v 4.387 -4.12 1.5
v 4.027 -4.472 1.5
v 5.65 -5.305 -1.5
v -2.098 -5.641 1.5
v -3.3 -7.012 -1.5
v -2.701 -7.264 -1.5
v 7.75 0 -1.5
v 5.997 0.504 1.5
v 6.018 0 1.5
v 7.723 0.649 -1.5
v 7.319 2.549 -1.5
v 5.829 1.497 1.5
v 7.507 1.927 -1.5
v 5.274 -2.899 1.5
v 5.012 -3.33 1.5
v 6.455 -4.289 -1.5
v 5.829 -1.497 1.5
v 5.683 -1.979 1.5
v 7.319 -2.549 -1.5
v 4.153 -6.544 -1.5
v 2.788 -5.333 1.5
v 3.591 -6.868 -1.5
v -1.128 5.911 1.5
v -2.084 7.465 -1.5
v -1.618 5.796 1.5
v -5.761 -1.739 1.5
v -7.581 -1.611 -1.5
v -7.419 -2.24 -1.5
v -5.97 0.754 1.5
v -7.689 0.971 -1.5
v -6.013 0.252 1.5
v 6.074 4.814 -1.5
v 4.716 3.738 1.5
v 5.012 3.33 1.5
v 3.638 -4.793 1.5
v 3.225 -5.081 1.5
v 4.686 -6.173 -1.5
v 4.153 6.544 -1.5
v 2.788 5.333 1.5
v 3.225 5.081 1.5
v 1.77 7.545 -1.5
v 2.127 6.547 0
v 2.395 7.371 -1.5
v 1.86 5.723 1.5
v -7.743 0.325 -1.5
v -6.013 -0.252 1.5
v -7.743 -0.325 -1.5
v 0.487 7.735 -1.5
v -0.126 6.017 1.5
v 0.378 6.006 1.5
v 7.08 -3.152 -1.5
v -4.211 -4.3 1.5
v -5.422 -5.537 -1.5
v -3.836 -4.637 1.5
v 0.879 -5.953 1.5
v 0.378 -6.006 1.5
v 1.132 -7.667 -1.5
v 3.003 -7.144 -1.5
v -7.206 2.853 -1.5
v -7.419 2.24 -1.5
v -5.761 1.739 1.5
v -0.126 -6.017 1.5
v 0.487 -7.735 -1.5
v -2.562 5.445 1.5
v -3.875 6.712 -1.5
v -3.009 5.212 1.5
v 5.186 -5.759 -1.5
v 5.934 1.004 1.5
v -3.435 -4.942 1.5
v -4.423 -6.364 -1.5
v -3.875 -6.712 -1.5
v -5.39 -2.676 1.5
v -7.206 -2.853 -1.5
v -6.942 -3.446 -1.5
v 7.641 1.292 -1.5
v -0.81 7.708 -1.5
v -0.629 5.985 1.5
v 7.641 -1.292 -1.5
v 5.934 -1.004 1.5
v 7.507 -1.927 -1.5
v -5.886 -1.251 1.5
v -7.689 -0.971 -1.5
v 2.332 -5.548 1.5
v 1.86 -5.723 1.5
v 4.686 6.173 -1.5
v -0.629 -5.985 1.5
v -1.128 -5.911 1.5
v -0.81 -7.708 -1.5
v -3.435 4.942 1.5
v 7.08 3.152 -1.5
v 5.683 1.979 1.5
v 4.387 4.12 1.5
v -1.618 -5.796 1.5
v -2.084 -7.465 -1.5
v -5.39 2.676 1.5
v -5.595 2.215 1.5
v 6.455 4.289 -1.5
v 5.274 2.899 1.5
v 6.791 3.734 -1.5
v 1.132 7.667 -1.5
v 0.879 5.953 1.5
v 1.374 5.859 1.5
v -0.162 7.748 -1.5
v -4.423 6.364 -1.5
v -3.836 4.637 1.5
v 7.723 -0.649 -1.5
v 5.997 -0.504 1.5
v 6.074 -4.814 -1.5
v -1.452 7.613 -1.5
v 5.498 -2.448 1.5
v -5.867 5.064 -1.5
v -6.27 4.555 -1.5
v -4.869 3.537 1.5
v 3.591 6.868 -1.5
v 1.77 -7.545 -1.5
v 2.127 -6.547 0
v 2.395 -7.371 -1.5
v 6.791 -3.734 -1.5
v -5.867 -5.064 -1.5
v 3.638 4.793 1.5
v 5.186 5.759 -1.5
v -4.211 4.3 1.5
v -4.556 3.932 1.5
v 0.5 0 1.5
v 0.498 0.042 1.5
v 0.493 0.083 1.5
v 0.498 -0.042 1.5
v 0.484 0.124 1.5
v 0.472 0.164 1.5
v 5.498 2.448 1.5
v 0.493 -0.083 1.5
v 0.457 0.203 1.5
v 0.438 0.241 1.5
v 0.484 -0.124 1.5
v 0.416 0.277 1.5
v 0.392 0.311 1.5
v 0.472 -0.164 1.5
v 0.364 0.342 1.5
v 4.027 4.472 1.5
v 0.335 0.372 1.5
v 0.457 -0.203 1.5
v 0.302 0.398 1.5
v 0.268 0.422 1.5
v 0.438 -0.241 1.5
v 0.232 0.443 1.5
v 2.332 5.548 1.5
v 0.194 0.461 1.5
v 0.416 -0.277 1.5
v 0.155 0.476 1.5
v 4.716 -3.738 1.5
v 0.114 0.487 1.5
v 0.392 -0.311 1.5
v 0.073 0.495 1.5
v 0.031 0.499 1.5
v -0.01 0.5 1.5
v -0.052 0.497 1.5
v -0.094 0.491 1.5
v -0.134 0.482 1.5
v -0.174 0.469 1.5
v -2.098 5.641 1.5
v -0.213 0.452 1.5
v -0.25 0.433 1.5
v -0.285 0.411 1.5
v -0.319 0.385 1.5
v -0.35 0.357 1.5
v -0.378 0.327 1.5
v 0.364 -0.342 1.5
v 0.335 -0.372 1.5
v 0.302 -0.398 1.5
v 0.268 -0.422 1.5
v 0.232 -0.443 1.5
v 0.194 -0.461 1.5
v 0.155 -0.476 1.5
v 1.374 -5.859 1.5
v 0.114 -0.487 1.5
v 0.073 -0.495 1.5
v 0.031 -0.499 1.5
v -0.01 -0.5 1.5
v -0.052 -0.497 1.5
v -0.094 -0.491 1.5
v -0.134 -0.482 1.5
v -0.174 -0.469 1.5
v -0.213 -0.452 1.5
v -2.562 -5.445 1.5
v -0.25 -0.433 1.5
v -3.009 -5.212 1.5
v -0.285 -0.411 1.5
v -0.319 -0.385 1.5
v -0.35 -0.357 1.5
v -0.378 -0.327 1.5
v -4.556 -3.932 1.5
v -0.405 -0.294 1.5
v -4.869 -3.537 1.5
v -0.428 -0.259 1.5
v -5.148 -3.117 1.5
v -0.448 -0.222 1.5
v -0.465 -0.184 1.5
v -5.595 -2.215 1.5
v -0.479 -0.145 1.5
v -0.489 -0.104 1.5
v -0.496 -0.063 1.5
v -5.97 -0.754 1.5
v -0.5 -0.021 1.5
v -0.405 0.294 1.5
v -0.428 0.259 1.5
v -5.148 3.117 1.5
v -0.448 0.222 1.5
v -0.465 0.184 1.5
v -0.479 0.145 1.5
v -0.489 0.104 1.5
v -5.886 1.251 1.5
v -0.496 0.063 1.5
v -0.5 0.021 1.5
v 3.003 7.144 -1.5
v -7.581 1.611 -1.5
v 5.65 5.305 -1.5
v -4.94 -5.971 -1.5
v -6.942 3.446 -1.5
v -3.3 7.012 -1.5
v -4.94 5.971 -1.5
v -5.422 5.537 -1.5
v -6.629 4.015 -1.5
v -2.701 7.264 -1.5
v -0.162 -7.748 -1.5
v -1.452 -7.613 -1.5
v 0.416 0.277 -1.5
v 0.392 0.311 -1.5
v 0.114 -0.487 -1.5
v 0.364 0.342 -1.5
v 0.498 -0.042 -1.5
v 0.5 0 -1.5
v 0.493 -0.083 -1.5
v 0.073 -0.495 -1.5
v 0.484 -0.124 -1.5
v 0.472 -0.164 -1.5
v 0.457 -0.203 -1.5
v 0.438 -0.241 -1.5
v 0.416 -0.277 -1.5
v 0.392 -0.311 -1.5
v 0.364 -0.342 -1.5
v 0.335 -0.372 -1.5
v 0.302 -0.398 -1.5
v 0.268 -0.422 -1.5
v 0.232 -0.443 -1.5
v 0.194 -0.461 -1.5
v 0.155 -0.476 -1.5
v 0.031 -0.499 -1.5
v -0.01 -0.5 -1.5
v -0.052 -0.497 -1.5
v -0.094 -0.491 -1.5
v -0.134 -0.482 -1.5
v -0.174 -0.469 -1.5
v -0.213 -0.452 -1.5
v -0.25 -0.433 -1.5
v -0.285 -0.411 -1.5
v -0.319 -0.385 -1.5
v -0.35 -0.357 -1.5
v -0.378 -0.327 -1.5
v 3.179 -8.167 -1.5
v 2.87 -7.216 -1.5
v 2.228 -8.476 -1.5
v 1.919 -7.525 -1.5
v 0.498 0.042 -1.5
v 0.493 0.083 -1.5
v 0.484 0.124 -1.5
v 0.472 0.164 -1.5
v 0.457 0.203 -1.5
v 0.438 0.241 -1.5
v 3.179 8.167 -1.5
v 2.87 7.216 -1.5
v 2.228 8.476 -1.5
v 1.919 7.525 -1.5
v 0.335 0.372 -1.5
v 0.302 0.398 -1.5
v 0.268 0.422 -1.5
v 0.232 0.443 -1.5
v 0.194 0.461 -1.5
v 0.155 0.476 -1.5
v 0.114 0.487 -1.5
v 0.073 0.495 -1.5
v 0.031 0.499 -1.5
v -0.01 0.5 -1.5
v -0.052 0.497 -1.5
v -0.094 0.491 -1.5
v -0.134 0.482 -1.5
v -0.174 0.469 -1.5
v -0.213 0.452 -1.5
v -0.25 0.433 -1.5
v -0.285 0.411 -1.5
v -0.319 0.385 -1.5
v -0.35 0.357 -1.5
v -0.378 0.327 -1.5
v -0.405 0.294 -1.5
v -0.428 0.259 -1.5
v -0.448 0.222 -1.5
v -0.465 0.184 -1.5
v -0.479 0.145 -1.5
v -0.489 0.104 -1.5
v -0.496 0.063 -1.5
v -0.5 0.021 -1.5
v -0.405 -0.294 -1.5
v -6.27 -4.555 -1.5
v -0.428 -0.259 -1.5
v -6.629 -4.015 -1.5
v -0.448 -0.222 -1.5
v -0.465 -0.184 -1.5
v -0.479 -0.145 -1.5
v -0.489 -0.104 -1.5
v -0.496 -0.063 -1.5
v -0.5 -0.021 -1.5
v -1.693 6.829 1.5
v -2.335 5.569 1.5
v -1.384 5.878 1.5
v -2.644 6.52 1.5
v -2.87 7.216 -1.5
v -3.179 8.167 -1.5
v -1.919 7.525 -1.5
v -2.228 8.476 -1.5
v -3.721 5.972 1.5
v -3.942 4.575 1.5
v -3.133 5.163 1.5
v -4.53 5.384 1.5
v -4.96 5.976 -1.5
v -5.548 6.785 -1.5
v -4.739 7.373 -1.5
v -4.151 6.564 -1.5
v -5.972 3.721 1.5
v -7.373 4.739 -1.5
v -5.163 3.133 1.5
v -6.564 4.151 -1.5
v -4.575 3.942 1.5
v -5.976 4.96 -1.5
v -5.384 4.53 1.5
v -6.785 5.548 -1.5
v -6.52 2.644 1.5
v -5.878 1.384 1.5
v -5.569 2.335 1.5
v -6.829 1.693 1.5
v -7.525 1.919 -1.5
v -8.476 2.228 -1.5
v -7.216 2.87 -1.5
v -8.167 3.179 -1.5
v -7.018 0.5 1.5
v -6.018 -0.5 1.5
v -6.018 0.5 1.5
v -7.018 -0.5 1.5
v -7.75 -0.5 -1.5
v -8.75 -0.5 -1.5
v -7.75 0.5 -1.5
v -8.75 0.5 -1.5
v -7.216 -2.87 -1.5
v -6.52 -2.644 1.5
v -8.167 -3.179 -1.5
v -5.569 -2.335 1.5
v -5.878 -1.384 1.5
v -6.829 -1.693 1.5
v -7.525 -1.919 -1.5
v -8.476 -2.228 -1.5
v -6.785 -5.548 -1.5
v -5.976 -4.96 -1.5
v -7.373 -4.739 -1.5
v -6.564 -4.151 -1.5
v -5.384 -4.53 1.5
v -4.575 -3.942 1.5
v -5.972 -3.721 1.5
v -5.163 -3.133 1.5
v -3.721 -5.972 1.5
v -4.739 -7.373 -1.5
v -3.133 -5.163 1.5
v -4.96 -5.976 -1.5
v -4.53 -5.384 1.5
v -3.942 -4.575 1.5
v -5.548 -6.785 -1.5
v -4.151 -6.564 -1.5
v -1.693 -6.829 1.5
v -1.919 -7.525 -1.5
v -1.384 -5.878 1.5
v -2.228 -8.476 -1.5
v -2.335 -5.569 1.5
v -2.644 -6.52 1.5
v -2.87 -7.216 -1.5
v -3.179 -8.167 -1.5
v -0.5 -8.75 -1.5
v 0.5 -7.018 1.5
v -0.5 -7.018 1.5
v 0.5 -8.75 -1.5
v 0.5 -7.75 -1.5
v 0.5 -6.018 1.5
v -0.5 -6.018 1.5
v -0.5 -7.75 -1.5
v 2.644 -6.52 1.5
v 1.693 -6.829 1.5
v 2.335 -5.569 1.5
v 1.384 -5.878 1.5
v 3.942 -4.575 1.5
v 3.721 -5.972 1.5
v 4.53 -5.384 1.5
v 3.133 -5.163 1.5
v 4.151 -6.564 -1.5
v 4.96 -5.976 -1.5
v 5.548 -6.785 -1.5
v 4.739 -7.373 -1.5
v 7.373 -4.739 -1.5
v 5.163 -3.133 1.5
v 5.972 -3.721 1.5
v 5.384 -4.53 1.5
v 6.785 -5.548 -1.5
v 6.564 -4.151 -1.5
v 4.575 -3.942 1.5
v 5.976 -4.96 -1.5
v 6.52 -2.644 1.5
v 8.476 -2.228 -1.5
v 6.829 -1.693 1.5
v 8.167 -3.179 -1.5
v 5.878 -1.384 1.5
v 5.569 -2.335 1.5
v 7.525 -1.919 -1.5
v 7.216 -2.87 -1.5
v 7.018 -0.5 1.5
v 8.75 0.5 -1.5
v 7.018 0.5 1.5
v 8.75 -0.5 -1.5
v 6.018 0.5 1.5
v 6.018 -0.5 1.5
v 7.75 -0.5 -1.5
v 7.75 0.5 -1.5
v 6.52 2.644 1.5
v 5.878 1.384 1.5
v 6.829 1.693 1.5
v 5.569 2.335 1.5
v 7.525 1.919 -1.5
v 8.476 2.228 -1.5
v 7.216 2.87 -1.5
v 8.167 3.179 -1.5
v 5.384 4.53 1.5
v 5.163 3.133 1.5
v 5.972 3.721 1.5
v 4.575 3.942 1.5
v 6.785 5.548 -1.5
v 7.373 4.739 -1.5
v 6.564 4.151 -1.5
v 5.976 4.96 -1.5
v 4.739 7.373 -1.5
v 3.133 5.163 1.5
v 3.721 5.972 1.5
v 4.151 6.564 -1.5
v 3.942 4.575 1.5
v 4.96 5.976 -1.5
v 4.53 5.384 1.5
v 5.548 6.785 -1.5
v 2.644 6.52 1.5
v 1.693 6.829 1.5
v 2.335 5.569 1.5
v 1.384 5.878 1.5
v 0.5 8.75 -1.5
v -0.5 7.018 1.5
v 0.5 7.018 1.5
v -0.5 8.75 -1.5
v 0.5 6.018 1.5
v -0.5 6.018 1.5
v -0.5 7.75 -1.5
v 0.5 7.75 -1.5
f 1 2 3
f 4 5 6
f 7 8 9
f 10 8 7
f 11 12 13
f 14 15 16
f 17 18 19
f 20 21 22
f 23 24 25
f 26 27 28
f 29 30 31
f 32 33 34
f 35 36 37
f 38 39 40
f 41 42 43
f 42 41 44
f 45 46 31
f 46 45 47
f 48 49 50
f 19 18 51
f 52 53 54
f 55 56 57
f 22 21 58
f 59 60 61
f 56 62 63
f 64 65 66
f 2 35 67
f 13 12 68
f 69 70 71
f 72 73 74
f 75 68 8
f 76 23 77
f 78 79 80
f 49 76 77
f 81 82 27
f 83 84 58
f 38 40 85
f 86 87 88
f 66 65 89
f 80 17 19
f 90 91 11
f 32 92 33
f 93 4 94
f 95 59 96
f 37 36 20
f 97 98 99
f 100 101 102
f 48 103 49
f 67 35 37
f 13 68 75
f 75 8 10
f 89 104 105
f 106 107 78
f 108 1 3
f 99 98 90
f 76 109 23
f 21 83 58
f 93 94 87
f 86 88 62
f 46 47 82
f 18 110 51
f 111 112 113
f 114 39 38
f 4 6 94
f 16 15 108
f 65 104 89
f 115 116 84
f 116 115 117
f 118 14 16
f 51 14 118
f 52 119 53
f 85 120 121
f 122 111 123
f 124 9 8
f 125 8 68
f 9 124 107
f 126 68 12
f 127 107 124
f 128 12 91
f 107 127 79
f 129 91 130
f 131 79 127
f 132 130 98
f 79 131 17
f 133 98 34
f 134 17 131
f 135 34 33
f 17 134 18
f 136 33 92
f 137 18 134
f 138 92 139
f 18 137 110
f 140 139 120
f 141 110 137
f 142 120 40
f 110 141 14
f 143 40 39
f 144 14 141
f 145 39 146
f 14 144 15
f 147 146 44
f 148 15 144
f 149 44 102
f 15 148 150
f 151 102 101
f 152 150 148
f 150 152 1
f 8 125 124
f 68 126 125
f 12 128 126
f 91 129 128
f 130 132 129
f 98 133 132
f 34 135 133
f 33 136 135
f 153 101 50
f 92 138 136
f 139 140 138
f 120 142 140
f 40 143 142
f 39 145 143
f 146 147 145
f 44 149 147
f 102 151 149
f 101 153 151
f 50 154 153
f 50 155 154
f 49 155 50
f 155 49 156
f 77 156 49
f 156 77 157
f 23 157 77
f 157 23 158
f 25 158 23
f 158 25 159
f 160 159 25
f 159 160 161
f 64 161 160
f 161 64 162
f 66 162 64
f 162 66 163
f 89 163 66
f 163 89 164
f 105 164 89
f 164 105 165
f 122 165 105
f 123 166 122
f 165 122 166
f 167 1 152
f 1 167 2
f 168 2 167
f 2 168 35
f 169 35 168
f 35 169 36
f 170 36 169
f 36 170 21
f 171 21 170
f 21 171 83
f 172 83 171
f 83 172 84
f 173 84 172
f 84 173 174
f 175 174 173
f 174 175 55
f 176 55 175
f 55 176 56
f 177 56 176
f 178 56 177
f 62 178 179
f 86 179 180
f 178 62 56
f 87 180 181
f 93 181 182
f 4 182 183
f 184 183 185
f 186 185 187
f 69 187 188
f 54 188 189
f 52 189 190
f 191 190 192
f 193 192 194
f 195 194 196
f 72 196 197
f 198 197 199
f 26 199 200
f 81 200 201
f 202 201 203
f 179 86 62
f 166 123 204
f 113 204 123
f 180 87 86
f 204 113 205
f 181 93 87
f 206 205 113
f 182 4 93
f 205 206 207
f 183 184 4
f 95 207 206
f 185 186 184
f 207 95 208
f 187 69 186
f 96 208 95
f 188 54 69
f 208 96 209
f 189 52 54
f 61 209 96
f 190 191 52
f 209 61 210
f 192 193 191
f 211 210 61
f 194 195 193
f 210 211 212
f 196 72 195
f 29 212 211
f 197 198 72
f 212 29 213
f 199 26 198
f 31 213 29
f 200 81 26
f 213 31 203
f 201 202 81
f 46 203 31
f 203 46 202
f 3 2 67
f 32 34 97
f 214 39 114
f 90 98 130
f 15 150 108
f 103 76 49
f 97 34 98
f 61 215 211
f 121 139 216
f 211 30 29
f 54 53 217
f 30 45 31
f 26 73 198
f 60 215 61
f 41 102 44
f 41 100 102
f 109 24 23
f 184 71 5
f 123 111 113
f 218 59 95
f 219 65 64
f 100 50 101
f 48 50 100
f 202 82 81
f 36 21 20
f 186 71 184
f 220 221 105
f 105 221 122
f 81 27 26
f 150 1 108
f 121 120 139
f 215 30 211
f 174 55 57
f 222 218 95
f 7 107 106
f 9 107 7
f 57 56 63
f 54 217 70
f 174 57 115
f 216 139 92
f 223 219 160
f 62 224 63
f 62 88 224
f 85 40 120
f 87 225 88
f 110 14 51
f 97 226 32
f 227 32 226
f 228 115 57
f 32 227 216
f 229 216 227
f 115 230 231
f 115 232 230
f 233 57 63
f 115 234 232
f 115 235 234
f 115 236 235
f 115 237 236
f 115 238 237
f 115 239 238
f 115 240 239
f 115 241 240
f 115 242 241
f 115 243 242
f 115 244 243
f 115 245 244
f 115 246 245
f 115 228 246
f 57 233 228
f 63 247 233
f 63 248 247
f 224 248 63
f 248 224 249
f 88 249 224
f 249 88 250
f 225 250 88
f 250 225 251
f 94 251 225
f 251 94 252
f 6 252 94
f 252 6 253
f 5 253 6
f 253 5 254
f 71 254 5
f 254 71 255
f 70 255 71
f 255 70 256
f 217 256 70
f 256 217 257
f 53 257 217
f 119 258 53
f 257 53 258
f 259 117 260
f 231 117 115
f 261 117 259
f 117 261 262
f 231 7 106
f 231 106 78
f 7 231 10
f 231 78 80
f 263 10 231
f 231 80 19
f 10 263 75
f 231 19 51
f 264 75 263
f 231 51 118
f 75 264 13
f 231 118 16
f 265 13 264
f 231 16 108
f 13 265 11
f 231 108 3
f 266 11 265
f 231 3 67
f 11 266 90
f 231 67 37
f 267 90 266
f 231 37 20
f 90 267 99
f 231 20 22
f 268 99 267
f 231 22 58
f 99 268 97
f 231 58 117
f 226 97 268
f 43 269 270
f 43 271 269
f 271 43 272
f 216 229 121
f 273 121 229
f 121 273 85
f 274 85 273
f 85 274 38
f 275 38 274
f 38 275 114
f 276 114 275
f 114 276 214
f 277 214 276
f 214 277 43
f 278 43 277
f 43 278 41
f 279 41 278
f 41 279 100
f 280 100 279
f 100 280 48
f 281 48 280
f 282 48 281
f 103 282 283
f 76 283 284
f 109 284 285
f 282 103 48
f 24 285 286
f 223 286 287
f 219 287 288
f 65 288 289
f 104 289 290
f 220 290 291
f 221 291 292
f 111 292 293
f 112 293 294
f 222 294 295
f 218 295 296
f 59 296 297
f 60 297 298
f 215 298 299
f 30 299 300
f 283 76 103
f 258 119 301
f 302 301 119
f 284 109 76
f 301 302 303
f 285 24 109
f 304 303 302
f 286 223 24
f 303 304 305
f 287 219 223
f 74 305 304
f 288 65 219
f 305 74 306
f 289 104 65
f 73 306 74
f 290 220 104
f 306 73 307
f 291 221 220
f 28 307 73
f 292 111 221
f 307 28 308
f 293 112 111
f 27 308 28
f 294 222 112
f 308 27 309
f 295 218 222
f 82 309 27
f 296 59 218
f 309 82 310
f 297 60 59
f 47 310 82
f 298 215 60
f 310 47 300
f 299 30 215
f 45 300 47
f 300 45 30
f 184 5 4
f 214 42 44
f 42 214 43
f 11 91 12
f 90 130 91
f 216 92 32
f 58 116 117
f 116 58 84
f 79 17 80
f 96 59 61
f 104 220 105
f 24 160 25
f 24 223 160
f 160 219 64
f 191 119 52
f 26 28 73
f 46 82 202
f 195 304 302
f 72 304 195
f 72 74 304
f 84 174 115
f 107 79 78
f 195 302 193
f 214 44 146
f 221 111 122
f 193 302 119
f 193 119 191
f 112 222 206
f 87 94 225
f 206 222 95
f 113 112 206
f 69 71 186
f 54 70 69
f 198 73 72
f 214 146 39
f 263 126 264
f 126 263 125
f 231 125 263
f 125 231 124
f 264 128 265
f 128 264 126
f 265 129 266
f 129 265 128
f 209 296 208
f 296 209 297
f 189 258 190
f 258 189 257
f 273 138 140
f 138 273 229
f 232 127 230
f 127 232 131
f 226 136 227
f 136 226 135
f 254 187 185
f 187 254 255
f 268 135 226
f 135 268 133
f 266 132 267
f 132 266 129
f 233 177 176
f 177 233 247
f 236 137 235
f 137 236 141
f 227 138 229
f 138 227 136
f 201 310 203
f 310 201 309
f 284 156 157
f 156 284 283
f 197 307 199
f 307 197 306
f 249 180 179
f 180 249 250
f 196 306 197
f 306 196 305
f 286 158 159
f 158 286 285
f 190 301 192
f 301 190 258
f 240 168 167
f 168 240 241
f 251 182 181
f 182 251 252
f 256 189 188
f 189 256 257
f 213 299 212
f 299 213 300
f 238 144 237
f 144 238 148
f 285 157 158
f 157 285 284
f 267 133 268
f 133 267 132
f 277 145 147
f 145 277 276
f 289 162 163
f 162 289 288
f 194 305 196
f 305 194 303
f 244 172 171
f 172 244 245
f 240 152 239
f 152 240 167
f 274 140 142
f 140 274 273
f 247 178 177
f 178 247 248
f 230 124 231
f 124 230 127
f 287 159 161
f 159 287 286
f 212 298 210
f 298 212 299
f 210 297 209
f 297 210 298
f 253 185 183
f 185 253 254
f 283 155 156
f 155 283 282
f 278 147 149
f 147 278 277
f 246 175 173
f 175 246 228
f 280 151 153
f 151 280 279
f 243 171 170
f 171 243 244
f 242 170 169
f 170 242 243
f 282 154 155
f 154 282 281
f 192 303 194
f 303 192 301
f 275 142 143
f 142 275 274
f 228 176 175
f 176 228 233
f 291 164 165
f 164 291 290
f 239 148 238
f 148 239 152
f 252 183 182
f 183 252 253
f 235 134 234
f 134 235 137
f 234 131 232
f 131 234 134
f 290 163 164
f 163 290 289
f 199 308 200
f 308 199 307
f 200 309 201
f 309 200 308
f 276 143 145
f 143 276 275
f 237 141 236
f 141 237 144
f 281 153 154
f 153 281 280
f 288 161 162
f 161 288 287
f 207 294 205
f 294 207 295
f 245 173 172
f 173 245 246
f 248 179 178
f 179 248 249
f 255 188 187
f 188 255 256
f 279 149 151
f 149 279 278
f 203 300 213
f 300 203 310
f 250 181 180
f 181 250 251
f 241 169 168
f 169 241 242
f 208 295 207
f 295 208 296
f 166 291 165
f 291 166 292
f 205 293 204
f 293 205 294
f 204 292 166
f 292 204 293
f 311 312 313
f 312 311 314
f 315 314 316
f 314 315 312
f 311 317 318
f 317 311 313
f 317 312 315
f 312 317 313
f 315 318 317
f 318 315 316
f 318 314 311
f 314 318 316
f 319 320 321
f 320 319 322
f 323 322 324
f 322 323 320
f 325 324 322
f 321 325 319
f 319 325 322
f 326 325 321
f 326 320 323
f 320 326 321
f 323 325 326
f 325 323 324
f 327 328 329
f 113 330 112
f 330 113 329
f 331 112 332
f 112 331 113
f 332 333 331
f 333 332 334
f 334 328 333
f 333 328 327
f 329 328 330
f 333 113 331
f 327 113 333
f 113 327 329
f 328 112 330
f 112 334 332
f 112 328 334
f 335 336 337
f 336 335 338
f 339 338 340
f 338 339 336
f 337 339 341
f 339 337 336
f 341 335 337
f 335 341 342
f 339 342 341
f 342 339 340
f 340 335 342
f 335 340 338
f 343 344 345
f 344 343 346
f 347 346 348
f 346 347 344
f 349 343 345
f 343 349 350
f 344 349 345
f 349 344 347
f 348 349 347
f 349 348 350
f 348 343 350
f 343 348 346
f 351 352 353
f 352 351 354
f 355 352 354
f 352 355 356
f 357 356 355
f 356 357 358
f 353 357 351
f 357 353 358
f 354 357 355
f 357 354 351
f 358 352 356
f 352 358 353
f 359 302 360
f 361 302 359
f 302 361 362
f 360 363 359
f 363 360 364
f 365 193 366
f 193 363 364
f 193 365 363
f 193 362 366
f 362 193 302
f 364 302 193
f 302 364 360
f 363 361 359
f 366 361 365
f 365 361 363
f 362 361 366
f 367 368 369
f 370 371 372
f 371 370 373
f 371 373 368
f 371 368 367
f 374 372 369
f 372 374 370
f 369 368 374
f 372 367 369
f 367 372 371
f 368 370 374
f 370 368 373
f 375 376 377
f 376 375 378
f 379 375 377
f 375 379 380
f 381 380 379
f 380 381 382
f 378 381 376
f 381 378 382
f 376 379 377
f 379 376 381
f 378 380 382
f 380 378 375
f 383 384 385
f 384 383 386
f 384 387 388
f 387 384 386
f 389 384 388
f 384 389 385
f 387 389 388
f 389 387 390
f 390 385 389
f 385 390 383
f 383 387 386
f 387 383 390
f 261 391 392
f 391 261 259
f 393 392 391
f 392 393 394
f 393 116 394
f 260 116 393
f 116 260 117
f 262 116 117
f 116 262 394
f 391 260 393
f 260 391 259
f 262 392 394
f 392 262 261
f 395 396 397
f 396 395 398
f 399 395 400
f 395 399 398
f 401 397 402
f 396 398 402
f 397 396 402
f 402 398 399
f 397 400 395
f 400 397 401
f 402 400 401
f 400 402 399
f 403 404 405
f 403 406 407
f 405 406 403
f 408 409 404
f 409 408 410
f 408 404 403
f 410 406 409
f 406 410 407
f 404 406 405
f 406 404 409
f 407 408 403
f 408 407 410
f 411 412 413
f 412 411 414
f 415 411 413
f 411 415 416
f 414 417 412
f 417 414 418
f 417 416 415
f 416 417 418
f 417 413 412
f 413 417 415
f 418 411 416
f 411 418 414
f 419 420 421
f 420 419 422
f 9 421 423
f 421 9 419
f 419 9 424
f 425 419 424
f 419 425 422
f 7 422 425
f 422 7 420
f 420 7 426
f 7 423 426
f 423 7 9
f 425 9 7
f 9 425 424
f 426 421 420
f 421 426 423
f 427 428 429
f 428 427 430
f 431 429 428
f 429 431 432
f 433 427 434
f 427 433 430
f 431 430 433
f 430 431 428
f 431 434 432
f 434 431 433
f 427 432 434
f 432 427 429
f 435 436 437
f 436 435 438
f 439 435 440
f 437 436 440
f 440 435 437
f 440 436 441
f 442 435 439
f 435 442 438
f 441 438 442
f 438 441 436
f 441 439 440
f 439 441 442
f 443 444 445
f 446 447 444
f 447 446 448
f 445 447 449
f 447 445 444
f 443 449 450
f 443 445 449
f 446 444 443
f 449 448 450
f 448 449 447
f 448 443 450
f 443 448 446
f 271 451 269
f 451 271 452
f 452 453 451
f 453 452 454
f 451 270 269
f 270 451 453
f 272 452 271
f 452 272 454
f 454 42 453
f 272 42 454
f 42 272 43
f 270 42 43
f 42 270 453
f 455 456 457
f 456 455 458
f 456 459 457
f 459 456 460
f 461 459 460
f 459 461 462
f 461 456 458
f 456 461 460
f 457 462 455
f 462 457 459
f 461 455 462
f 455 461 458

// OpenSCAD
// Parametric Gears
// by wayland
// http://www.thingiverse.com/thing:2085

// General Parameters

basediameter = 16;   // pitch diameter of widest part 
depth = 3;           // depth of the gear
holediam = 1;        // diameter of center hole
teethnumber = 20;    // number of teeth
toothwidth = 1;      // width of teeth
addendum = 1/2;      // addendum
dedendum = 1/2;      // dedendum
toothshape = 0;   // how much of the tooth is triangular			                // for no triangles, make it 0
				 // otherwise it should be a fraction
centercircles = 0;   // number of center circles
				 // if you don't want any, put 0
				 // they are radially centered
centercircdiam = 2;  // diameter of center circles


//Bevel Parameters

degrees = 60;        // base angle of the gear
				 // 90 for a regular spur gear
				 // negative numbers are possible
extendbevel = 0;     // creates a spur top for bevel gears 
				 // only works if rbasediameter = 0
				 // 1 is on, 0 is off
bdepth = 3;          // thickness of extended bevel 
basedepth = 2;       // depth of the flat base at the bottom
				 // to turn it off, just make it 0

//Rome Gear Parameters:

rbasediameter = 0;   // pitch diameter of widest part
				 // to turn Rome gear off, make it 0
rdegrees = 90;       // base angle
rdepth = 2;          // thickness
rteeth = 10;         // number of teeth
rtwidth = 1;         // tooth width
raddendum = 1/4;     // addendum
rdedendum = 1/4;     // dedendum
rtoothshape = 1;

/*---------------------------------------------------------*/

// Modules

module gear (diam1, thick, angle, ded, add, twidth, tnumber, toothfraction)
 {

	//Trig to find top diameter:

	triangbase = thick / tan(angle);
	topdiameter =  (diam1 - 2 * triangbase) - ded;

	//Miscellaneous variables:

	bottomdiameter = diam1 - ded;
	howmuchistri = toothfraction * (add + ded);
	toothlength = (add + ded) - howmuchistri; 
	xthick = twidth/2;

	union() {

		difference () {

			cylinder(h = thick, r1 = bottomdiameter/2, r2 = topdiameter/2, $fn = 75, center = true);
			cylinder(h = 2*thick, r = holediam / 2, center = true, $fn = 75);
			centershape(thick, topdiameter);

			}

		}

		for ( i = [1:tnumber] ) {

			rotate( i*360/tnumber, [0, 0, 1])
			translate ([0, 0, thick / -2])

			geartooth (bottomdiameter, topdiameter, xthick, toothlength, thick, howmuchistri);

		}

}

module centershape (thick, diam) {

if (centercircles > 0) {

	for ( f = [1:centercircles] ) {

		rotate( f*360/centercircles, [0, 0, 1])
		translate ([diam/4, 0, 0 ])
		cylinder ( h = 2*thick, r = centercircdiam/2, $fn = 75, center = true);

	}

}

}

module geartooth (diam1, diam2, xthickness, tlength, zthick, point){

// Sorry... polyhedra are so messy in openSCAD
// In case you're wondering, the following polyhedra are one
// tooth. The first is rectangular, the second has triangles.

	if (point == 0) {

	polyhedron ( points = 
[[-xthickness, diam2/2, zthick], [-xthickness, tlength + diam2/2, zthick], [-xthickness, tlength + diam1/2, 0], [-xthickness, diam1/2, 0], [xthickness, diam2/2, zthick], [xthickness, tlength + diam2/2, zthick], [xthickness, tlength + diam1/2, 0], [xthickness, diam1/2, 0]
], triangles = [[0,2,1], [0,3,2],[3,0,4],[1,2,5],[0,5,4],[0,1,5],[5,2,6],[7,3,4],[4,5,6],[4,6,7],[6,2,7],[2,3,7]]);

	}

	if (point > 0 ) {

		polyhedron ( points = 
[[-xthickness, diam2/2, zthick], [-xthickness, tlength + diam2/2, zthick], [-xthickness, tlength + diam1/2, 0], [-xthickness, diam1/2, 0], [xthickness, diam2/2, zthick], [xthickness, tlength + diam2/2, zthick], [xthickness, tlength + diam1/2, 0], [xthickness, diam1/2, 0],[0, tlength + diam2/2 + point, zthick],[0, tlength + diam1/2 + point, 0]
], triangles = [[0,2,1], [0,3,2],[3,0,4],[1,2,8],[0,5,4],[0,1,5],[5,9,6],[7,3,4],[4,5,6],[4,6,7],[6,2,7],[2,3,7],[1,8,5],[2,6,9],[2,9,8],[5,8,9],]);

	}

}
/*---------------------------------------------------------*/
gear (basediameter, depth, degrees, dedendum, addendum, toothwidth, teethnumber, toothshape);

if (rbasediameter > 0) {

	translate ([0, 0, depth/2 + rdepth/2])
	gear (rbasediameter, rdepth, rdegrees, rdedendum, raddendum, rtwidth, rteeth, rtoothshape);

}

//More trig to find top diameter:

	triangbase = depth / tan(degrees);
	topdiameter =  (basediameter - 2 * triangbase);

if (rbasediameter == 0 && extendbevel == 1) {

	translate ([0, 0, depth/2 + bdepth/2])
	gear (topdiameter, bdepth, 90, dedendum, addendum, toothwidth, teethnumber);

}
